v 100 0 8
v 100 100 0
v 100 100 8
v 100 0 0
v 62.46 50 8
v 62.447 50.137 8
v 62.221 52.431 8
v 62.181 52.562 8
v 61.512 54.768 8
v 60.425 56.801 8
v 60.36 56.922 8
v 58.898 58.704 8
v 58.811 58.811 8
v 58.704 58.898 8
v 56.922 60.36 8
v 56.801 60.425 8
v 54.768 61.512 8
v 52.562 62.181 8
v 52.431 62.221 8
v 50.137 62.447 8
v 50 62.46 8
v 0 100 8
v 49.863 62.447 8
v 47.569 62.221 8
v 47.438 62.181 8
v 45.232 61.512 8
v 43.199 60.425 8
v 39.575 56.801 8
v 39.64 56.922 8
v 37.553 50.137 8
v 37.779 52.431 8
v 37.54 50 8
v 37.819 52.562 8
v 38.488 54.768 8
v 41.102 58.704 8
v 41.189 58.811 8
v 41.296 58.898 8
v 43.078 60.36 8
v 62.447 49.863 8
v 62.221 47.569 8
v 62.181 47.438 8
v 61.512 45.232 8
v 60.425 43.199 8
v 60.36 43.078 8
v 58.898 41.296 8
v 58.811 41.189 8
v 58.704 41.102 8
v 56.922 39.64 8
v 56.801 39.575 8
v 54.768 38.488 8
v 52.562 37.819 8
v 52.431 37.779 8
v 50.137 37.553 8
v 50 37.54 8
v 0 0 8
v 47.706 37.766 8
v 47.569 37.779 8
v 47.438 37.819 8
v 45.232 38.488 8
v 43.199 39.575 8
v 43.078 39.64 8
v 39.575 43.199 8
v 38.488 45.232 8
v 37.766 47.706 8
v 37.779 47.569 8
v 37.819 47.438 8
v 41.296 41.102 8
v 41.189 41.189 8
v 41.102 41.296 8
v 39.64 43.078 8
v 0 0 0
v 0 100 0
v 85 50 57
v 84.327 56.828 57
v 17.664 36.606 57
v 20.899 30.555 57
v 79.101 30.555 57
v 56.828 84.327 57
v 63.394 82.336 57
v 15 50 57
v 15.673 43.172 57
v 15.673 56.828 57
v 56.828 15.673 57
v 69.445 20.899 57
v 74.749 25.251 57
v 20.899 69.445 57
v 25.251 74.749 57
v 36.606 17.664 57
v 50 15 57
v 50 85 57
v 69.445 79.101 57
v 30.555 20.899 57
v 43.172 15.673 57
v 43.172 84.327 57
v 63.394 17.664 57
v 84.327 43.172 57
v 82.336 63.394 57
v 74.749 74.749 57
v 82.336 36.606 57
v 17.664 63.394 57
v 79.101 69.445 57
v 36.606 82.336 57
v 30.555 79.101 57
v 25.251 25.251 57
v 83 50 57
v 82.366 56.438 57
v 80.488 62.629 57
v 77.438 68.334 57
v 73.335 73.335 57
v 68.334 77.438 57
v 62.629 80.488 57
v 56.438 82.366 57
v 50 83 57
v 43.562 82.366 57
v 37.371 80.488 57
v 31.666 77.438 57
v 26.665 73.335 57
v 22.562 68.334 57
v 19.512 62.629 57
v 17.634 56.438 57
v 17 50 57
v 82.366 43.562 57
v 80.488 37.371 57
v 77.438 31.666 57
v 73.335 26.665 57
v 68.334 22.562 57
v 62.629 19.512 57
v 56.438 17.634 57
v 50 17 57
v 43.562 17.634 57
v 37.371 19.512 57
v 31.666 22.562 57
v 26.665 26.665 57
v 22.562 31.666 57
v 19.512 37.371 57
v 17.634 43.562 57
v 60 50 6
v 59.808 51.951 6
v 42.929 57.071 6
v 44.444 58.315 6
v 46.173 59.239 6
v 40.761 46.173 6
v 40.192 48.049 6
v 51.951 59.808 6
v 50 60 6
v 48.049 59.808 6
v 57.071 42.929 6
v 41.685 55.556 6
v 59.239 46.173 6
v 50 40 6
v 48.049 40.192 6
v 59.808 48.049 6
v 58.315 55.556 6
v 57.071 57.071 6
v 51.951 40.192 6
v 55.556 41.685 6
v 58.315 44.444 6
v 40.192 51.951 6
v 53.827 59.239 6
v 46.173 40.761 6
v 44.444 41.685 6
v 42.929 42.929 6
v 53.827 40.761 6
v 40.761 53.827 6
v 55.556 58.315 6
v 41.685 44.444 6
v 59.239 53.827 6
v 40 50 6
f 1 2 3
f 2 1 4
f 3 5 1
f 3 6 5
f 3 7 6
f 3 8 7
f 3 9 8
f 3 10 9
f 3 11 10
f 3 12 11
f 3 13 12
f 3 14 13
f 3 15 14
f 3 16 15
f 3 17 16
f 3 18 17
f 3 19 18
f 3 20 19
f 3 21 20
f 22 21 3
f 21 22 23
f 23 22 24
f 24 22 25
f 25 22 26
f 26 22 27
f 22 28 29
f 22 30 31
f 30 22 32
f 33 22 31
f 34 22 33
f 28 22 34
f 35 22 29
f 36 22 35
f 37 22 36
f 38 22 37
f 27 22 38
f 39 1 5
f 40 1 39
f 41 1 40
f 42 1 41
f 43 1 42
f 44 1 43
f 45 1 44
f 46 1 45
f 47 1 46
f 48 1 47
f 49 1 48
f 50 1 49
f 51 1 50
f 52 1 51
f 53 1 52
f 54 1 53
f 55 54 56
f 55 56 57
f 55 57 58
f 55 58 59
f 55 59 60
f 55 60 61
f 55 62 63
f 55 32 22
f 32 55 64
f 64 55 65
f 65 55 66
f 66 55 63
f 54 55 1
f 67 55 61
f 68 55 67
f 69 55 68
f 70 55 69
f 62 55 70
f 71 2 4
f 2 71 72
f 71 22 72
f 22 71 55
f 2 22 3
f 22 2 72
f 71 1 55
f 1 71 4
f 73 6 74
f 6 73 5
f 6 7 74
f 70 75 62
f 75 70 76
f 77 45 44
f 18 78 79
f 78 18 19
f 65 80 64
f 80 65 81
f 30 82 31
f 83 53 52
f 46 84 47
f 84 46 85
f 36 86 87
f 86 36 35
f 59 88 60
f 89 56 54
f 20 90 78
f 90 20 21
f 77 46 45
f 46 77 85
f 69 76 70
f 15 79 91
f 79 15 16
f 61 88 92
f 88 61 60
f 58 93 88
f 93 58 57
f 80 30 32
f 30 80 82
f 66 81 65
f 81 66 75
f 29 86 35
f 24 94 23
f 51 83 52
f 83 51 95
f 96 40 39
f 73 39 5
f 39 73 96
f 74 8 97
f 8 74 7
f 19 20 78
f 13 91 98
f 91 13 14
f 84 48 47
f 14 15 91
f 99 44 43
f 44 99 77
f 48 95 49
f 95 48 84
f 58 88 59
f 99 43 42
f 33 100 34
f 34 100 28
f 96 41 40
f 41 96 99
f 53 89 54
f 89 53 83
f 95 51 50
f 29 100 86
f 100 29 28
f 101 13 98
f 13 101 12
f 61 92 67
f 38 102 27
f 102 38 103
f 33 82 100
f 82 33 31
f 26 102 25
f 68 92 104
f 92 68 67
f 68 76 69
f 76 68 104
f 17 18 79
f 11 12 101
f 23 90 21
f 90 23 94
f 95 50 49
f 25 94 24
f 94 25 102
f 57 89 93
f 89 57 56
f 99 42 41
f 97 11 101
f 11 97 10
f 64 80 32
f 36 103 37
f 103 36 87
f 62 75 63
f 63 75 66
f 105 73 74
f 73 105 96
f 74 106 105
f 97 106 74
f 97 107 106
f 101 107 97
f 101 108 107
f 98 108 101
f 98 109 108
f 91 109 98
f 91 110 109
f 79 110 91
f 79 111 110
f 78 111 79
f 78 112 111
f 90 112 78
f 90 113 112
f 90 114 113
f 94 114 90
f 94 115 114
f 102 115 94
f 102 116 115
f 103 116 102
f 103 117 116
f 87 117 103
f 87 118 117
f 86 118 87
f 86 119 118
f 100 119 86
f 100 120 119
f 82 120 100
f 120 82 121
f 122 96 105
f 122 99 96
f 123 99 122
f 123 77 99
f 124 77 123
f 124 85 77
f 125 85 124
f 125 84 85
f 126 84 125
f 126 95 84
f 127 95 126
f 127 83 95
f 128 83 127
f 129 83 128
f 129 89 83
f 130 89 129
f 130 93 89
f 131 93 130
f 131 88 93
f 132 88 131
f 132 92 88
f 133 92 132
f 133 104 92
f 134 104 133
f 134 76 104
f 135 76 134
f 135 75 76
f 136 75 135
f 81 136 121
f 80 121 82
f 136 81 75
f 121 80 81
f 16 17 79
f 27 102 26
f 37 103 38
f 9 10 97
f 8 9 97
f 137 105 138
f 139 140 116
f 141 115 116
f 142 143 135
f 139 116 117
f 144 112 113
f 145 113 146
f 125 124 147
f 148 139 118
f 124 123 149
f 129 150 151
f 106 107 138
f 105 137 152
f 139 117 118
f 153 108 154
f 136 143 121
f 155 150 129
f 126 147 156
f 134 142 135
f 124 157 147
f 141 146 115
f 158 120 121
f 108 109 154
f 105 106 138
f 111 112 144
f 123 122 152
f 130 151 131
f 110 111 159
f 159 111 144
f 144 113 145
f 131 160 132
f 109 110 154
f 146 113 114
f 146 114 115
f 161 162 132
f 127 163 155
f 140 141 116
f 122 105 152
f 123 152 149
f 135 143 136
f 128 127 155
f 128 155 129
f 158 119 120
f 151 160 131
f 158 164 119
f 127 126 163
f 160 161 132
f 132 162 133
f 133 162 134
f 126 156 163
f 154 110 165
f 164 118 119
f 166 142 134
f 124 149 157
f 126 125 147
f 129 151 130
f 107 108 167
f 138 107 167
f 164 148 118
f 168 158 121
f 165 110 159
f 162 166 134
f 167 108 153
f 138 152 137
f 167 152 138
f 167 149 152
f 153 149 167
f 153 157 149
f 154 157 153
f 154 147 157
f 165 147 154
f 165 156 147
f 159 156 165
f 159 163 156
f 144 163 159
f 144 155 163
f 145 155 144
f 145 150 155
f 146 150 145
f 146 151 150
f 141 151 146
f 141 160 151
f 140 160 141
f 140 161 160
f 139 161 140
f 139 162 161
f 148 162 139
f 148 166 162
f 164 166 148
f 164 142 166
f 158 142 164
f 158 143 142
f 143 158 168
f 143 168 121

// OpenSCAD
$fn = 32;

// ----------------------------------------------------------------------
// Hopper: funnel with square flange
// ----------------------------------------------------------------------

// --- parameters (mm) ---
fl = 100;                 // flange side, X and Y
fl_t = 8;                 // flange thickness
cone_h = 50;              // cone height above the flange
top_d = 70;               // cone mouth diameter
bot_d = 24;               // cone spout diameter
wall = 2;                 // cone wall thickness

bore_d = bot_d - 2 * wall;  // spout bore diameter
total_h = fl_t + cone_h - 1;  // overall height

difference() {
  union() {
    cube([fl, fl, fl_t]);
    translate([fl / 2, fl / 2, fl_t - 1])
      cylinder(h = cone_h, d1 = bot_d, d2 = top_d);
  }
  translate([fl / 2, fl / 2, fl_t - 2])
    cylinder(h = cone_h + 1, d1 = bore_d, d2 = top_d - 2 * wall);
}
